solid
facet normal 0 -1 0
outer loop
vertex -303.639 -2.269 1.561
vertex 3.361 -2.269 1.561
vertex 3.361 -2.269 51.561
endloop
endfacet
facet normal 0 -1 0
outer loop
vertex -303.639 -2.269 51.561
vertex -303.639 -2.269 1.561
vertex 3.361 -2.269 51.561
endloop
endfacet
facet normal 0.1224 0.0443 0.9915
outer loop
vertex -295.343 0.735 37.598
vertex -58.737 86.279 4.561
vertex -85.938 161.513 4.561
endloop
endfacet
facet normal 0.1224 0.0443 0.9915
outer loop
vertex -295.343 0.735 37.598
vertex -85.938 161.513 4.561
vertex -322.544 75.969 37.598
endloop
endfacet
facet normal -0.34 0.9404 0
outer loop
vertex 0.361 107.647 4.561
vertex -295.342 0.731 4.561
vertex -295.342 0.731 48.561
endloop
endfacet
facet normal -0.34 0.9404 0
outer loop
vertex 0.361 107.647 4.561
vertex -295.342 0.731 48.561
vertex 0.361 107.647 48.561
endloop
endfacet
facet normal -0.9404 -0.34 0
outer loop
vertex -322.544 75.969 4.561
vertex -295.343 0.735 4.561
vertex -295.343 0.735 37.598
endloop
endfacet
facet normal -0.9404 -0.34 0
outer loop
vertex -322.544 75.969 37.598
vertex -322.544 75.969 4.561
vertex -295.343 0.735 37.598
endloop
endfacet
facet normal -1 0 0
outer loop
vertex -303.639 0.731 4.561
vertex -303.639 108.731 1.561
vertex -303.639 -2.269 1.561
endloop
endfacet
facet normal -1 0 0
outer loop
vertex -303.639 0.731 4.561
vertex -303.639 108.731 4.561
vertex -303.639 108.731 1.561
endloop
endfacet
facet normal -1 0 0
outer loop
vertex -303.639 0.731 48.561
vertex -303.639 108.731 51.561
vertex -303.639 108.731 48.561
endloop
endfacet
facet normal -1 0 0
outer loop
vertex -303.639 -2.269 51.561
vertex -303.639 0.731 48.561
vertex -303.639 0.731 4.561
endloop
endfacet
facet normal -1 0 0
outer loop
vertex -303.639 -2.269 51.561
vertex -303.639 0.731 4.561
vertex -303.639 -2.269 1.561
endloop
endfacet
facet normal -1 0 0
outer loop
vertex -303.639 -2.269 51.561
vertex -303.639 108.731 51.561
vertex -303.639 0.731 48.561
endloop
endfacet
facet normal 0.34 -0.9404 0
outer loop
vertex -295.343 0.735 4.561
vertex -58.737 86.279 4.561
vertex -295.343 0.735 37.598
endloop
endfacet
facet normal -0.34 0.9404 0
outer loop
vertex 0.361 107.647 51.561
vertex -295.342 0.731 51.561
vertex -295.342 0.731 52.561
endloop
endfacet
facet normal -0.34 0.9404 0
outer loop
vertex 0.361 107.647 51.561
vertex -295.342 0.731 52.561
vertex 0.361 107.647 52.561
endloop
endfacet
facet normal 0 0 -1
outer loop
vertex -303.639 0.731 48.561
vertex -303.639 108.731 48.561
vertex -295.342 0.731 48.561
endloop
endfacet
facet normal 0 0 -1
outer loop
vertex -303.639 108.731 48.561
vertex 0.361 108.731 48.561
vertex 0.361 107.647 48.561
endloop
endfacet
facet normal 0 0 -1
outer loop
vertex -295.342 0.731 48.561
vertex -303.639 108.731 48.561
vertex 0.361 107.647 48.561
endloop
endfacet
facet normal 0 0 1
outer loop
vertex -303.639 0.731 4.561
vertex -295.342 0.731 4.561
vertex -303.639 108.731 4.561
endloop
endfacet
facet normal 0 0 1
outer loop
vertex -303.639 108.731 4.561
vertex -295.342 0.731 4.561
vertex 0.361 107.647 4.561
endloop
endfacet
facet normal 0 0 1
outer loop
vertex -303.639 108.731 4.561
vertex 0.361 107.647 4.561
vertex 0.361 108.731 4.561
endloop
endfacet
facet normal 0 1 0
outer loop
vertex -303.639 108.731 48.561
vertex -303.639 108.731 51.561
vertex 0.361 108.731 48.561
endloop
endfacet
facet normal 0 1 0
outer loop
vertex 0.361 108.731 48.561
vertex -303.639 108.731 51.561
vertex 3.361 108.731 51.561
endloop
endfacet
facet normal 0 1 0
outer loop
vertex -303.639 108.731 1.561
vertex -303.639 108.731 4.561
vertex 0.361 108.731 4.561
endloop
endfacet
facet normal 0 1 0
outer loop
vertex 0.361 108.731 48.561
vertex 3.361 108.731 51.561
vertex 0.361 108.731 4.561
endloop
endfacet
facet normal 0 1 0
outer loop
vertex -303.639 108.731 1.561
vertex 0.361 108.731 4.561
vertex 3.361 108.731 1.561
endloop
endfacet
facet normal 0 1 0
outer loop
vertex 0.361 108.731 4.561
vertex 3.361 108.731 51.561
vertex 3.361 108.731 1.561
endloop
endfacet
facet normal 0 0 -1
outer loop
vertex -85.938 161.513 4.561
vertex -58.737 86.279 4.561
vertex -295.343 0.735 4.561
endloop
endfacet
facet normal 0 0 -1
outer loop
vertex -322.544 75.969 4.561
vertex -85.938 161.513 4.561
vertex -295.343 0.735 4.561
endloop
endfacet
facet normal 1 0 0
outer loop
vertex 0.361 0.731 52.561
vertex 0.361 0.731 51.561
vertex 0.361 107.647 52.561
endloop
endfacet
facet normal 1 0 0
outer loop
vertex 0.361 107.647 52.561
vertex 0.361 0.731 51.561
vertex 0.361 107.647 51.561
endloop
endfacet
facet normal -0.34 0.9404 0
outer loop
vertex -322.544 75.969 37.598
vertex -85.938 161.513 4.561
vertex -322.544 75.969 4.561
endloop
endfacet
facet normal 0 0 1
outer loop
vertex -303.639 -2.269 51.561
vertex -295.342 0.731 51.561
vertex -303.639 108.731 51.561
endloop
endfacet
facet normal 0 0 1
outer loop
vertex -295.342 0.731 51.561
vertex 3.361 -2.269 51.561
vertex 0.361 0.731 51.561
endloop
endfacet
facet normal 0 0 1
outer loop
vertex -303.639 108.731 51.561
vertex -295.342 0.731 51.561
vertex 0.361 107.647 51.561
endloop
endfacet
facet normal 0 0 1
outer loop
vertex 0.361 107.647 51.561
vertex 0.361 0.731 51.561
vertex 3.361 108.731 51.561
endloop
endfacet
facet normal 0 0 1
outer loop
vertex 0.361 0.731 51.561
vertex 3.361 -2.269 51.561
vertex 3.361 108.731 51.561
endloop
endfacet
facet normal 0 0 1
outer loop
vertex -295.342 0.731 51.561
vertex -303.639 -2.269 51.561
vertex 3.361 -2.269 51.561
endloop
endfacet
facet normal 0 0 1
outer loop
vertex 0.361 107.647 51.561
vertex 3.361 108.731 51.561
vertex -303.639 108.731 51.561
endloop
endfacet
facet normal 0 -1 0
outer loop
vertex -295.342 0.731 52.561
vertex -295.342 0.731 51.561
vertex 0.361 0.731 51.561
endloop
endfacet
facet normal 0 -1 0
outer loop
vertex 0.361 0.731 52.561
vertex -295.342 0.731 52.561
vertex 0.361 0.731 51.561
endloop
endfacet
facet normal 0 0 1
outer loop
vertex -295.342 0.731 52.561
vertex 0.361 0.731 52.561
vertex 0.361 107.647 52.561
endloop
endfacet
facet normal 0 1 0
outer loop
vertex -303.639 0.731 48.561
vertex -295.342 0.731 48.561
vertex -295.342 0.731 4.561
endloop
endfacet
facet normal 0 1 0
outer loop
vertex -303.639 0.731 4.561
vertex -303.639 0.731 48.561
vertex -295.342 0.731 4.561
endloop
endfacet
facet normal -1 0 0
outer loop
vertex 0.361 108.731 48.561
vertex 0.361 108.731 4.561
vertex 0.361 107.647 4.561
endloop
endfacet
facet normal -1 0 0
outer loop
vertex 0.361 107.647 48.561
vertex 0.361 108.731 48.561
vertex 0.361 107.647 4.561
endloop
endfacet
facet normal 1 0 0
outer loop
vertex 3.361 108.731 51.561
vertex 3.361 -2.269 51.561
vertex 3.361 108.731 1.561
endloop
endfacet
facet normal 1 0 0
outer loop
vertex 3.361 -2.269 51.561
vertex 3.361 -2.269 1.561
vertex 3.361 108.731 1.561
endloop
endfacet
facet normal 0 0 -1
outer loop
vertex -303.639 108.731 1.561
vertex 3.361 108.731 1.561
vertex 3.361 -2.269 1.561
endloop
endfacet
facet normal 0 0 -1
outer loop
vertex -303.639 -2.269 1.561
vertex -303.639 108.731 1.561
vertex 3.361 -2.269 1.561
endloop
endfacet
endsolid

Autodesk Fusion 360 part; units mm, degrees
sketch "Sketch3" plane through (0, 0, 0) normal (0, 0, 1) x (1, 0, 0) in component "Pill Holder "
  line L0 (0, -3.5074) -> (3, -3.5074)
  line L1 (3, -3.5074) -> (3, 110.4926)
  line L2 (3, 110.4926) -> (0, 110.4926)
  line L3 (0, 110.4926) -> (0, -3.5074)
  dimension "d20" = 114
  dimension "d21" = 3
extrude "Extrude6" add sketch "Sketch3" along normal blind 50 makes body 1 in component "Pill Holder "
sketch "Sketch4" plane through (0, 0, 0) normal (-1, 0, 0) x (0, -1, 0) in component "Pill Holder "
  line L0 (-110.4926, 0) -> (3.5074, 0)
  line L1 (3.5074, 0) -> (3.5074, 50)
  line L2 (3.5074, 50) -> (-110.4926, 50)
  line L3 (-110.4926, 50) -> (-110.4926, 0)
  line L4 (0.5074, 3) -> (-107.4926, 3)
  line L5 (-107.4926, 3) -> (-107.4926, 47)
  line L6 (-107.4926, 47) -> (0.5074, 47)
  line L7 (0.5074, 47) -> (0.5074, 3)
  dimension "d24" = 3
  dimension "d25" = 3
  dimension "d26" = 3
  dimension "d27" = 3
extrude "Extrude7" add sketch "Sketch4" along normal blind 304 bodies 1 in component "Pill Holder "
extrude "Extrude8" cut 1 faces at (-201.6667, 110.4926, 16.6667) along direction (0, -1, 0) blind 3 on bodies 1 bodies 1 in component "Pill Holder "
sketch "Sketch5" plane through (0, 0, 3) normal (0, 0, 1) x (-1, 0, 0) in component "Pill Holder "
  line L0 (0, 0.5074) -> (0, -107.4926)
  line L1 (0, -107.4926) -> (304, -107.4926)
  line L2 (304, -107.4926) -> (304, 0.5074)
  line L3 (304, 0.5074) -> (0, 0.5074)
  line L4 (-3, -107.4926) -> (304, -107.4926)
  line L5 (304, -107.4926) -> (304, 3.5074)
  line L6 (304, 3.5074) -> (-3, 3.5074)
  line L7 (-3, 3.5074) -> (-3, -107.4926)
  line L8 (0, -107.4926) -> (0, 0.5074)
  line L9 (0, 0.5074) -> (304, 0.5074)
  line L10 (304, 0.5074) -> (304, -107.4926)
  line L11 (304, -107.4926) -> (0, -107.4926)
  line L12 (304, 3.5074) -> (-3, -107.4926)
extrude "Extrude11" add sketch "Sketch5" along normal blind 48 contours L0 L3 L8 L9 L12 bodies 1 in component "Pill Holder "
sketch "Sketch6" plane through (-304, 0, 0) normal (-1, 0, 0) x (0, -1, 0) in component "Pill Holder "
  line L0 (-107.4926, 50) -> (-107.4926, 47)
  line L1 (-107.4926, 47) -> (0.5074, 47)
  line L2 (0.5074, 3) -> (-107.4926, 3)
  line L3 (-107.4926, 0) -> (3.5074, 0)
  line L4 (3.5074, 0) -> (3.5074, 50)
  line L5 (3.5074, 50) -> (-107.4926, 50)
  line L6 (3.5074, 9.4187) -> (-98.3183, 50)
  line L7 (0.5074, 47) -> (0.5074, 3)
  line L8 (-107.4926, 3) -> (-107.4926, 0)
sketch "Sketch7" plane through (-34.0252, 94.1056, 0) normal (-0.34, 0.9404, 0) x (-0.9404, -0.34, 0) in component "Pill Holder "
  line L0 (278.2567, 47) -> (-36.1809, 47)
  line L1 (-36.1809, 47) -> (-36.1809, 3)
  line L2 (-36.1809, 3) -> (278.2567, 3)
  line L3 (278.2567, 3) -> (278.2567, 47)
  line L4 (52.2027, 3) -> (278.2567, 38.5389)
sketch "Sketch8" plane through (0, 0, 3) normal (0, 0, 1) x (-1, 0, 0) in component "Pill Holder "
  line L0 (295.7027, 0.5074) -> (0, -106.4079)
  line L1 (0, -106.4079) -> (0, -107.4926)
  line L2 (0, -107.4926) -> (304, -107.4926)
  line L3 (304, -107.4926) -> (304, 0.5074)
  line L4 (304, 0.5074) -> (295.7027, 0.5074)
sketch "Sketch1" plane through (-34.0252, 94.1056, 0) normal (-0.34, 0.9404, 0) x (-0.9404, -0.34, 0) in component "wal"
  line L0 (278.2567, 47) -> (-36.1809, 47)
  line L1 (-36.1809, 47) -> (-36.1809, 3)
  line L2 (-36.1809, 3) -> (278.2567, 3)
  line L3 (278.2567, 3) -> (278.2567, 47)
  line L4 (26.6613, 3) -> (278.2567, 36.0366)
  dimension "d44" = 253.7551
extrude "Extrude1" add sketch "Sketch1" along normal blind 80 separate body contours L2 L3 L4 makes body 2 in component "wal"
component "Pill Holder " placed x (1, 0, 0) y (0, 1, 0) z (0, 0, 1) at (0.3608, 1.2387, 1.5611)
component "wal" placed x (1, 0, 0) y (0, 1, 0) z (0, 0, 1) at (0, 0, 0) in component "Pill Holder "
